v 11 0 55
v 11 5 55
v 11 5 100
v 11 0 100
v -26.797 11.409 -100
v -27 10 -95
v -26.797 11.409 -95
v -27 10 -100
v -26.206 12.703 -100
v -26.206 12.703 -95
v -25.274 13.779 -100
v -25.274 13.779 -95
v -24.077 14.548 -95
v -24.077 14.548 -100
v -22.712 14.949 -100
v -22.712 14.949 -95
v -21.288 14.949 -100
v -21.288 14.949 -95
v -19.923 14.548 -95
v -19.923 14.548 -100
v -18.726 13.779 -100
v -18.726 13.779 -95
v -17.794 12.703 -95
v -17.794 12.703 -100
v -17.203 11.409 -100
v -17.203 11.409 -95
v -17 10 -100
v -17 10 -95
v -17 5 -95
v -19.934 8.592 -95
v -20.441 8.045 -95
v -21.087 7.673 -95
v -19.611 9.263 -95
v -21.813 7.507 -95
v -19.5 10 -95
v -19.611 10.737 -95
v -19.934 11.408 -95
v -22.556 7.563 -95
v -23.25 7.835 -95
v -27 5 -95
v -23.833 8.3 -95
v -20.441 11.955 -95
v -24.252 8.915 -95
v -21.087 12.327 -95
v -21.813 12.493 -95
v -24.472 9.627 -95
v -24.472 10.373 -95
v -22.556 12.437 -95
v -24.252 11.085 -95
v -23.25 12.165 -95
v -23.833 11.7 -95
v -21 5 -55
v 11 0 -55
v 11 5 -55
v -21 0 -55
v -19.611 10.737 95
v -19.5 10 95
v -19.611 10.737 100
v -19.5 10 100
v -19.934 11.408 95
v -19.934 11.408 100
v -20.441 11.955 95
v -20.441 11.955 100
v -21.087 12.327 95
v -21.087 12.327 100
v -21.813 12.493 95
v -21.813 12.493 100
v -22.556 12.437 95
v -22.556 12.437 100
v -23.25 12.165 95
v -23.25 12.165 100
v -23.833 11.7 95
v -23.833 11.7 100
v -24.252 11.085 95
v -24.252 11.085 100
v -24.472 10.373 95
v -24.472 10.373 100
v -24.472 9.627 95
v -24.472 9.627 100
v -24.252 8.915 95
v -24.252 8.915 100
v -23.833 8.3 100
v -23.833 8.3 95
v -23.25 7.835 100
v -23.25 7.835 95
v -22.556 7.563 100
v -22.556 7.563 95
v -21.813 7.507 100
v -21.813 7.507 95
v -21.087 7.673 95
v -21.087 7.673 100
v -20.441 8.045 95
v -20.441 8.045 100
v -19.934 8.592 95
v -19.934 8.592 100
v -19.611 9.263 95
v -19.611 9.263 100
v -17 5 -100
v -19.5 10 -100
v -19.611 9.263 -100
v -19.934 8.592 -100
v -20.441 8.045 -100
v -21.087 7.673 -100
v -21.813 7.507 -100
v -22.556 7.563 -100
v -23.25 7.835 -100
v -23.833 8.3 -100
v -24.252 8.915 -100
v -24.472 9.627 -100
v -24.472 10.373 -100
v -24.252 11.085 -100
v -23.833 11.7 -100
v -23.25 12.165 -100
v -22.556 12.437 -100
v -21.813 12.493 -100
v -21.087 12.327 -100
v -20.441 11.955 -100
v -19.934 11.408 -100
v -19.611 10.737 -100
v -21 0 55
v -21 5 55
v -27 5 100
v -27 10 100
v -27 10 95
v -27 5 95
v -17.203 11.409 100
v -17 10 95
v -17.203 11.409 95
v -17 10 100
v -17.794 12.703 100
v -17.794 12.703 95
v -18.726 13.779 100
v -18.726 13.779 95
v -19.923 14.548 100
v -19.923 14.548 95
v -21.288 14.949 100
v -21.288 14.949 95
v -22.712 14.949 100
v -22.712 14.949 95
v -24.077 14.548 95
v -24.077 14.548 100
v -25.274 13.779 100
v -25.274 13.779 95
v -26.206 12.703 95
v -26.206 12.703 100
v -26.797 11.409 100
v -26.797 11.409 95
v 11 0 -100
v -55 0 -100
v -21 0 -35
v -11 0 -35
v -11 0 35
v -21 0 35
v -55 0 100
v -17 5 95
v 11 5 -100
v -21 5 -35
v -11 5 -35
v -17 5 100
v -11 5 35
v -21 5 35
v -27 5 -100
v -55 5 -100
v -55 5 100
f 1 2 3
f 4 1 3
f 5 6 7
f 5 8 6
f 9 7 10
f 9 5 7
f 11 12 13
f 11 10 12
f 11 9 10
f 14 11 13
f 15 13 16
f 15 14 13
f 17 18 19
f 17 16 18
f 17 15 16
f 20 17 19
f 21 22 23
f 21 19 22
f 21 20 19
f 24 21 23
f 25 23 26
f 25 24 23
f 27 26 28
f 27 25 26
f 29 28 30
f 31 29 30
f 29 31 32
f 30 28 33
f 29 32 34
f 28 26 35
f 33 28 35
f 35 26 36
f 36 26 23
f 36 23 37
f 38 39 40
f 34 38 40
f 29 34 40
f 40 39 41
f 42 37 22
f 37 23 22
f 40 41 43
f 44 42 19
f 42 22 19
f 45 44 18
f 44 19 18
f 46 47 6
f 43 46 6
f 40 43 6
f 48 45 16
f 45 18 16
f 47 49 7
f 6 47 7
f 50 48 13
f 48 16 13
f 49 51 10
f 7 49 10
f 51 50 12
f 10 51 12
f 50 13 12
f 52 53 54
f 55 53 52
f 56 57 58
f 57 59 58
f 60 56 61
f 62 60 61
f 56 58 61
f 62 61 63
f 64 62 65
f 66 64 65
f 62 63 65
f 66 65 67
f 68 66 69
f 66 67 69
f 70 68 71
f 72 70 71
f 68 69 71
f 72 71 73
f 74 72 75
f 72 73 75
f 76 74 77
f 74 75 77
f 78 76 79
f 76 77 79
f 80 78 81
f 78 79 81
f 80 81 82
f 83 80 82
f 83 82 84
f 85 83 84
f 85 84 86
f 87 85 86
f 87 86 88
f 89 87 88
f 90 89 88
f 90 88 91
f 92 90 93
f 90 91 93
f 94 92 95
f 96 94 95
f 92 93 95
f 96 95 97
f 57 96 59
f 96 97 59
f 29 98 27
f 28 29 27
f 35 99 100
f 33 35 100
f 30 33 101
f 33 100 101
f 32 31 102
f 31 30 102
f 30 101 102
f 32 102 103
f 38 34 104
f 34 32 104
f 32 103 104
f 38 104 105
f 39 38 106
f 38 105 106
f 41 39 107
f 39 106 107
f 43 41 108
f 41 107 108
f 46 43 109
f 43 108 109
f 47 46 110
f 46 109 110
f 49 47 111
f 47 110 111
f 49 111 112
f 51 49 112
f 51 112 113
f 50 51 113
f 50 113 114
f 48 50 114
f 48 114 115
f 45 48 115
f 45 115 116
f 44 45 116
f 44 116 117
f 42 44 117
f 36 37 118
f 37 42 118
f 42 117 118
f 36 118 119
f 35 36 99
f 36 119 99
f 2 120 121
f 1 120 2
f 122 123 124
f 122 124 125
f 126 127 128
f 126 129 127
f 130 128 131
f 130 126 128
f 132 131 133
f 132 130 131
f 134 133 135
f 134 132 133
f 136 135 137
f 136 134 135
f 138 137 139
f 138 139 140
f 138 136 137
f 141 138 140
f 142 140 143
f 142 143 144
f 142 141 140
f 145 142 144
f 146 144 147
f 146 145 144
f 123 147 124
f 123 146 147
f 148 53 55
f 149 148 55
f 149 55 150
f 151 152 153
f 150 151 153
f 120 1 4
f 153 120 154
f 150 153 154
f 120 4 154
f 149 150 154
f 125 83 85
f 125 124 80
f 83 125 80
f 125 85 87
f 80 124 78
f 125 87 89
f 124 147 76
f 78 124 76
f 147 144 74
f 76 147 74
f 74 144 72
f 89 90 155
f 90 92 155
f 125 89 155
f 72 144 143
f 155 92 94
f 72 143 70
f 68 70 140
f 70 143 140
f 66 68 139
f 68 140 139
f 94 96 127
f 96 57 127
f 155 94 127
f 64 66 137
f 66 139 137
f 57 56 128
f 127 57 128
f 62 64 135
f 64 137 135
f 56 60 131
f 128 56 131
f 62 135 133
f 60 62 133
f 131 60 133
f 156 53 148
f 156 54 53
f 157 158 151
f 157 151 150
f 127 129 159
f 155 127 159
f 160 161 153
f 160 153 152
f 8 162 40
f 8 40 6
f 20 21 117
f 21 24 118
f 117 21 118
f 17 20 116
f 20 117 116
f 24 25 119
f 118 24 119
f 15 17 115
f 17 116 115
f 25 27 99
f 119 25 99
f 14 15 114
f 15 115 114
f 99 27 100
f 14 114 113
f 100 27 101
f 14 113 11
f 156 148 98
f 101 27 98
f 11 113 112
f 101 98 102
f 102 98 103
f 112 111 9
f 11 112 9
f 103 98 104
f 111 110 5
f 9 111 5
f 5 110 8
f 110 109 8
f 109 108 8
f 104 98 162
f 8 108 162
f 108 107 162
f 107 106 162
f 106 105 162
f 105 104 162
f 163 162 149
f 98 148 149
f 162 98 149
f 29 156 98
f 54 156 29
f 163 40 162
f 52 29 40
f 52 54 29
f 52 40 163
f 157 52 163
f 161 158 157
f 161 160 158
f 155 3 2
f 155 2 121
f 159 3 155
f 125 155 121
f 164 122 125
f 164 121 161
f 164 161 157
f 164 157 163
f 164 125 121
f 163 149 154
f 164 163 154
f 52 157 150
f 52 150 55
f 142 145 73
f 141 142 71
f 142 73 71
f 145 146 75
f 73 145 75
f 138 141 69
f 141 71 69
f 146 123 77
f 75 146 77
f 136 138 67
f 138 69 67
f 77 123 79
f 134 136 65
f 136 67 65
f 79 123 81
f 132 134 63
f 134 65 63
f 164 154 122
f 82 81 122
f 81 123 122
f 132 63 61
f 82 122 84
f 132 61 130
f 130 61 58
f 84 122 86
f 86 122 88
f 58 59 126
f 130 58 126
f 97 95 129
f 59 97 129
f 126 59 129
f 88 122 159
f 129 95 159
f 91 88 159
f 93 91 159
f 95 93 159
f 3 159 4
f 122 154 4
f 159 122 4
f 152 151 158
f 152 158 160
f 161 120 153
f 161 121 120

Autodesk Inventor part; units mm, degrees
ref_plane "YZ Plane" through (0, 0, 0) normal (1, 0, 0) x (0, 1, 0)
ref_plane "XZ Plane" through (0, 0, 0) normal (0, 1, 0) x (-1, 0, 0)
sketch "Sketch1" plane through (0, 0, 0) normal (0, 1, 0) x (-1, 0, 0)
  line L0 (11, 55) -> (-11, 55)
  line L1 (-11, 55) -> (-11, -55)
  line L2 (-11, -55) -> (11, -55)
  line L3 (11, -55) -> (11, 55)
  line L4 (11, 55) -> (-11, -55) construction
  line L5 (-11, 55) -> (11, -55) construction
  line L6 (55, 100) -> (-55, 100)
  line L7 (-55, 100) -> (-55, -100)
  line L8 (-55, -100) -> (55, -100)
  line L9 (55, -100) -> (55, 100)
  line L10 (55, 100) -> (-55, -100) construction
  line L11 (-55, 100) -> (55, -100) construction
  line L12 (55, 100) -> (7.4, 100)
  line L13 (7.4, 100) -> (7.4, 46.4)
  line L14 (7.4, 46.4) -> (55, 46.4)
  line L15 (55, 46.4) -> (55, 100)
  line L16 (55, 0) -> (11, 0)
  circle A0 centre (33, 0) radius 4
  line L17 (-11, -55) -> (-11, -100)
  circle A1 centre (0, -75) radius 5
  point P0 (0, 0)
  dimension "d0" = 22
  dimension "d1" = 110
  dimension "d2" = 200
  dimension "d3" = 110
  dimension "d6" = 53.6
  dimension "d7" = 47.6
  dimension "d12" = 8
  dimension "d17" = 10
  dimension "d20" = 20
extrude "Extrusion1" add sketch "Sketch1" along normal blind 5 contours L0 L13 L6 L9 L14 L3 | L0 L1 L17 L8 L7 L6 L13 | L14 L9 L16 A0 L3 | L16 A0 L9 L8 L17 L2 L3 | A0 L16 | L16 A0 | A1
sketch "Sketch3" plane through (0, 5, 0) normal (0, 1, 0) x (1, 0, 0)
  line L0 (11, 55) -> (11, -55) projected
  line L1 (11, -55) -> (11, -100)
  line L2 (-55, -100) -> (55, -100) projected
  line L3 (-11, 55) -> (11, 55) projected
  line L4 (11, 55) -> (11, 100)
  line L5 (55, 100) -> (-55, 100) projected
  line L6 (55, -100) -> (55, 100) projected
  point P0 (0, 0)
extrude "Extrusion3" cut sketch "Sketch3" against normal through all
sketch "Sketch4" plane through (0, 5, 0) normal (0, 1, 0) x (1, 0, 0)
  line L0 (-11, -55) -> (-11, 55) projected
  line L1 (-11, -55) -> (-21, -55)
  line L2 (-21, -55) -> (-21, -35)
  line L3 (-21, -35) -> (-11, -35)
  point P0 (0, 0)
  dimension "d21" = 10
  dimension "d22" = 20
extrude "Extrusion6" cut sketch "Sketch4" against normal through all
mirror "Mirror1" about plane through (0, 0, 0) normal (0, 0, 1) of "Extrusion6"
sketch "Sketch5" plane through (-55, 0, 100) normal (0, 0, 1) x (1, 0, 0)
  circle A0 centre (33, 10) radius 2.5
  circle A1 centre (33, 10) radius 5
  line L0 (66, 0) -> (66, 5) projected
  line L1 (0, 5) -> (66, 5) projected
  line L2 (0, 0) -> (0, 5) projected
  line L3 (0, 0) -> (66, 0) projected
  line L4 (0, 5) -> (66, 5) projected
  line L5 (38, 10) -> (38, 5)
  line L6 (66, 5) -> (0, 5) projected
  line L7 (33, 0) -> (33, 5)
  line L8 (28, 10) -> (28, 5)
  point P0 (55, 0)
  point P1 (38, 5)
  point P2 (33, 5)
  point P3 (28, 5)
  dimension "d25" = 5
  dimension "d26" = 10
extrude "Extrusion7" add sketch "Sketch5" against normal blind 5 contours A1 | L5 L1 A1 | A1 L1 L8
ref_plane "Work Plane2" through (-55, 0, 0) normal (0, 0, 1) x (1, 0, 0)
mirror "Mirror4" about plane through (-55, 0, 0) normal (0, 0, 1) of "Extrusion7"
properties part number "FP V2 Mounting Claw"
